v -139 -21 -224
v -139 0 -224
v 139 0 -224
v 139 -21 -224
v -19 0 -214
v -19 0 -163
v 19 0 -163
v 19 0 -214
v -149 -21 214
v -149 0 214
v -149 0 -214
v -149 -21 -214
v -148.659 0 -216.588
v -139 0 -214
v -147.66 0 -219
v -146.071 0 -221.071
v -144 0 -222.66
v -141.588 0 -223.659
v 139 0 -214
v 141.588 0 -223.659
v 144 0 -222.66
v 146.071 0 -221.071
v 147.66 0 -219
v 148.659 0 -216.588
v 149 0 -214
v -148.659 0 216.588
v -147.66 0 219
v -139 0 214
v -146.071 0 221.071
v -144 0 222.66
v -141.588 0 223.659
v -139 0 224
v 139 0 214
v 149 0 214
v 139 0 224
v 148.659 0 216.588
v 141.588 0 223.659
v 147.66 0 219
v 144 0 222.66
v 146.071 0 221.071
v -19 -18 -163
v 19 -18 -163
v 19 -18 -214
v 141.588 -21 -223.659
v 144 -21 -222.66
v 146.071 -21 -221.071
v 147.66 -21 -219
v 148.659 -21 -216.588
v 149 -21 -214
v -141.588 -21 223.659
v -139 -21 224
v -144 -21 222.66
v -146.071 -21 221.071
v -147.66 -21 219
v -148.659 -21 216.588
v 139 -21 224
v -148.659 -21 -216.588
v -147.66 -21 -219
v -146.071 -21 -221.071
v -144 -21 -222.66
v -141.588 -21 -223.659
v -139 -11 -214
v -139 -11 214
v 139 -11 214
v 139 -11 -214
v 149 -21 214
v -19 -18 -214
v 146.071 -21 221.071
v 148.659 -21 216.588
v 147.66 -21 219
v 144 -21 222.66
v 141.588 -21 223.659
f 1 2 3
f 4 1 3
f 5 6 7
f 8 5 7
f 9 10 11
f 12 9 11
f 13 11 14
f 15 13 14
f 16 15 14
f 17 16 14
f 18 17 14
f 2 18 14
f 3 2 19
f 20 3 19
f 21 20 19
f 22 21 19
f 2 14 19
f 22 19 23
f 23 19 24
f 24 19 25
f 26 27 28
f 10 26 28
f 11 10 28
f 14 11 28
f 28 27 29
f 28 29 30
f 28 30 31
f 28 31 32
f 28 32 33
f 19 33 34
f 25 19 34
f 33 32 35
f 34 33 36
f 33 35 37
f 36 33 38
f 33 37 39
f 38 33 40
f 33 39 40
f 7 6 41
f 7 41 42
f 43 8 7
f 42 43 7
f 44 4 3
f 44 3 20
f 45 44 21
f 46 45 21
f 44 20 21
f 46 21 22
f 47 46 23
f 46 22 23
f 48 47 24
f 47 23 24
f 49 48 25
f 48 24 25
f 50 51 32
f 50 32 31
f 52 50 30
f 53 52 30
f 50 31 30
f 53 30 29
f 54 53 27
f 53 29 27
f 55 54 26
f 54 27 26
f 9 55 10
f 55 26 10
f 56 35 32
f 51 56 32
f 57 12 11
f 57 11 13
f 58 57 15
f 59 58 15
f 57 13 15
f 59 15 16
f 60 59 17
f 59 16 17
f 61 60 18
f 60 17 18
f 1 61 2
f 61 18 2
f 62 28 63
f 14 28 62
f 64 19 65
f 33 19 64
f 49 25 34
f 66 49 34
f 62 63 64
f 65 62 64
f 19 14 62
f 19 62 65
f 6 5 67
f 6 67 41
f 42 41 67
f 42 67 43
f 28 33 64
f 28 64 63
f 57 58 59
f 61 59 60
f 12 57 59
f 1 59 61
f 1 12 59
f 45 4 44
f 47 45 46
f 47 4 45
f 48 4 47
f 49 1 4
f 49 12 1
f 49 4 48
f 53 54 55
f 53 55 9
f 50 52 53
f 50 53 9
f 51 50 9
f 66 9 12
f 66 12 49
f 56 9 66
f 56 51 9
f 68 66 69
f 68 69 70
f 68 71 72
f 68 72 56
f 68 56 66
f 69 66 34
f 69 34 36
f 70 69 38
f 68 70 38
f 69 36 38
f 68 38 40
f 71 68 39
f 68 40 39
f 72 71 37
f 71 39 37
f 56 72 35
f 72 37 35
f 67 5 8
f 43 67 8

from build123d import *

# Parameters (mm, degrees)
F0_W     = 38
F0_H     = 51
F1_DEPTH = 21
F2_DEPTH = 18
F3_T     = 10


# Not quite as in the source:
# - a shell that OpenCascade refuses in one call is made with other operations: the cavity is built on its own and cut out


with BuildPart() as f1:
    # F0 (on Front) → F1 (new body)
    with BuildSketch(Plane.XZ):
        with BuildLine():
            Line((139, 224), (-139, 224))
            ThreePointArc((-139, 224), (-146.0710678119, 221.0710678119), (-149, 214))
            Line((-149, 214), (-149, -214))
            ThreePointArc((-149, -214), (-146.0710678119, -221.0710678119), (-139, -224))
            Line((-139, -224), (139, -224))
            ThreePointArc((139, -224), (146.0710678119, -221.0710678119), (149, -214))
            Line((149, -214), (149, 214))
            ThreePointArc((149, 214), (146.0710678119, 221.0710678119), (139, 224))
        make_face()
        with Locations((0, -188.5)):
            Rectangle(F0_W, F0_H, mode=Mode.SUBTRACT)
        with Locations((0, -188.5)):
            Rectangle(F0_W, F0_H)
    extrude(amount=F1_DEPTH)

    # F3: shell of thickness 10, made by hand


with BuildPart() as f2:
    # F0 (on Front) → F2 (new body)
    with BuildSketch(Plane.XZ):
        with Locations((0, -188.5)):
            Rectangle(F0_W, F0_H)
    extrude(amount=F2_DEPTH)


with BuildPart() as f3_core1:
    # F3_t2: copy of F1
    add(f1.part)

    # the walls: a layer under each face that stays
    f3_faces = [f3_core1.faces().sort_by_distance(p)[0] for p in [
        (0, -10.5, 224),
        (-149, -10.5, 0),
        (0, -10.5, -224),
        (149, -10.5, 0),
        (0, -21, 0),
    ]]
    thicken(f3_faces, amount=-F3_T, mode=Mode.SUBTRACT)


with BuildPart() as f1_1:
    add(f1.part)

    # what is left inside the walls is the cavity
    f3_cavity = [f3_core1.part.solids().sort_by_distance(p)[0] for p in [
        (0, -0.1, -71.333333),
    ]]
    add(f3_cavity, mode=Mode.SUBTRACT)


solid = Compound([f2.part, f1_1.part])
